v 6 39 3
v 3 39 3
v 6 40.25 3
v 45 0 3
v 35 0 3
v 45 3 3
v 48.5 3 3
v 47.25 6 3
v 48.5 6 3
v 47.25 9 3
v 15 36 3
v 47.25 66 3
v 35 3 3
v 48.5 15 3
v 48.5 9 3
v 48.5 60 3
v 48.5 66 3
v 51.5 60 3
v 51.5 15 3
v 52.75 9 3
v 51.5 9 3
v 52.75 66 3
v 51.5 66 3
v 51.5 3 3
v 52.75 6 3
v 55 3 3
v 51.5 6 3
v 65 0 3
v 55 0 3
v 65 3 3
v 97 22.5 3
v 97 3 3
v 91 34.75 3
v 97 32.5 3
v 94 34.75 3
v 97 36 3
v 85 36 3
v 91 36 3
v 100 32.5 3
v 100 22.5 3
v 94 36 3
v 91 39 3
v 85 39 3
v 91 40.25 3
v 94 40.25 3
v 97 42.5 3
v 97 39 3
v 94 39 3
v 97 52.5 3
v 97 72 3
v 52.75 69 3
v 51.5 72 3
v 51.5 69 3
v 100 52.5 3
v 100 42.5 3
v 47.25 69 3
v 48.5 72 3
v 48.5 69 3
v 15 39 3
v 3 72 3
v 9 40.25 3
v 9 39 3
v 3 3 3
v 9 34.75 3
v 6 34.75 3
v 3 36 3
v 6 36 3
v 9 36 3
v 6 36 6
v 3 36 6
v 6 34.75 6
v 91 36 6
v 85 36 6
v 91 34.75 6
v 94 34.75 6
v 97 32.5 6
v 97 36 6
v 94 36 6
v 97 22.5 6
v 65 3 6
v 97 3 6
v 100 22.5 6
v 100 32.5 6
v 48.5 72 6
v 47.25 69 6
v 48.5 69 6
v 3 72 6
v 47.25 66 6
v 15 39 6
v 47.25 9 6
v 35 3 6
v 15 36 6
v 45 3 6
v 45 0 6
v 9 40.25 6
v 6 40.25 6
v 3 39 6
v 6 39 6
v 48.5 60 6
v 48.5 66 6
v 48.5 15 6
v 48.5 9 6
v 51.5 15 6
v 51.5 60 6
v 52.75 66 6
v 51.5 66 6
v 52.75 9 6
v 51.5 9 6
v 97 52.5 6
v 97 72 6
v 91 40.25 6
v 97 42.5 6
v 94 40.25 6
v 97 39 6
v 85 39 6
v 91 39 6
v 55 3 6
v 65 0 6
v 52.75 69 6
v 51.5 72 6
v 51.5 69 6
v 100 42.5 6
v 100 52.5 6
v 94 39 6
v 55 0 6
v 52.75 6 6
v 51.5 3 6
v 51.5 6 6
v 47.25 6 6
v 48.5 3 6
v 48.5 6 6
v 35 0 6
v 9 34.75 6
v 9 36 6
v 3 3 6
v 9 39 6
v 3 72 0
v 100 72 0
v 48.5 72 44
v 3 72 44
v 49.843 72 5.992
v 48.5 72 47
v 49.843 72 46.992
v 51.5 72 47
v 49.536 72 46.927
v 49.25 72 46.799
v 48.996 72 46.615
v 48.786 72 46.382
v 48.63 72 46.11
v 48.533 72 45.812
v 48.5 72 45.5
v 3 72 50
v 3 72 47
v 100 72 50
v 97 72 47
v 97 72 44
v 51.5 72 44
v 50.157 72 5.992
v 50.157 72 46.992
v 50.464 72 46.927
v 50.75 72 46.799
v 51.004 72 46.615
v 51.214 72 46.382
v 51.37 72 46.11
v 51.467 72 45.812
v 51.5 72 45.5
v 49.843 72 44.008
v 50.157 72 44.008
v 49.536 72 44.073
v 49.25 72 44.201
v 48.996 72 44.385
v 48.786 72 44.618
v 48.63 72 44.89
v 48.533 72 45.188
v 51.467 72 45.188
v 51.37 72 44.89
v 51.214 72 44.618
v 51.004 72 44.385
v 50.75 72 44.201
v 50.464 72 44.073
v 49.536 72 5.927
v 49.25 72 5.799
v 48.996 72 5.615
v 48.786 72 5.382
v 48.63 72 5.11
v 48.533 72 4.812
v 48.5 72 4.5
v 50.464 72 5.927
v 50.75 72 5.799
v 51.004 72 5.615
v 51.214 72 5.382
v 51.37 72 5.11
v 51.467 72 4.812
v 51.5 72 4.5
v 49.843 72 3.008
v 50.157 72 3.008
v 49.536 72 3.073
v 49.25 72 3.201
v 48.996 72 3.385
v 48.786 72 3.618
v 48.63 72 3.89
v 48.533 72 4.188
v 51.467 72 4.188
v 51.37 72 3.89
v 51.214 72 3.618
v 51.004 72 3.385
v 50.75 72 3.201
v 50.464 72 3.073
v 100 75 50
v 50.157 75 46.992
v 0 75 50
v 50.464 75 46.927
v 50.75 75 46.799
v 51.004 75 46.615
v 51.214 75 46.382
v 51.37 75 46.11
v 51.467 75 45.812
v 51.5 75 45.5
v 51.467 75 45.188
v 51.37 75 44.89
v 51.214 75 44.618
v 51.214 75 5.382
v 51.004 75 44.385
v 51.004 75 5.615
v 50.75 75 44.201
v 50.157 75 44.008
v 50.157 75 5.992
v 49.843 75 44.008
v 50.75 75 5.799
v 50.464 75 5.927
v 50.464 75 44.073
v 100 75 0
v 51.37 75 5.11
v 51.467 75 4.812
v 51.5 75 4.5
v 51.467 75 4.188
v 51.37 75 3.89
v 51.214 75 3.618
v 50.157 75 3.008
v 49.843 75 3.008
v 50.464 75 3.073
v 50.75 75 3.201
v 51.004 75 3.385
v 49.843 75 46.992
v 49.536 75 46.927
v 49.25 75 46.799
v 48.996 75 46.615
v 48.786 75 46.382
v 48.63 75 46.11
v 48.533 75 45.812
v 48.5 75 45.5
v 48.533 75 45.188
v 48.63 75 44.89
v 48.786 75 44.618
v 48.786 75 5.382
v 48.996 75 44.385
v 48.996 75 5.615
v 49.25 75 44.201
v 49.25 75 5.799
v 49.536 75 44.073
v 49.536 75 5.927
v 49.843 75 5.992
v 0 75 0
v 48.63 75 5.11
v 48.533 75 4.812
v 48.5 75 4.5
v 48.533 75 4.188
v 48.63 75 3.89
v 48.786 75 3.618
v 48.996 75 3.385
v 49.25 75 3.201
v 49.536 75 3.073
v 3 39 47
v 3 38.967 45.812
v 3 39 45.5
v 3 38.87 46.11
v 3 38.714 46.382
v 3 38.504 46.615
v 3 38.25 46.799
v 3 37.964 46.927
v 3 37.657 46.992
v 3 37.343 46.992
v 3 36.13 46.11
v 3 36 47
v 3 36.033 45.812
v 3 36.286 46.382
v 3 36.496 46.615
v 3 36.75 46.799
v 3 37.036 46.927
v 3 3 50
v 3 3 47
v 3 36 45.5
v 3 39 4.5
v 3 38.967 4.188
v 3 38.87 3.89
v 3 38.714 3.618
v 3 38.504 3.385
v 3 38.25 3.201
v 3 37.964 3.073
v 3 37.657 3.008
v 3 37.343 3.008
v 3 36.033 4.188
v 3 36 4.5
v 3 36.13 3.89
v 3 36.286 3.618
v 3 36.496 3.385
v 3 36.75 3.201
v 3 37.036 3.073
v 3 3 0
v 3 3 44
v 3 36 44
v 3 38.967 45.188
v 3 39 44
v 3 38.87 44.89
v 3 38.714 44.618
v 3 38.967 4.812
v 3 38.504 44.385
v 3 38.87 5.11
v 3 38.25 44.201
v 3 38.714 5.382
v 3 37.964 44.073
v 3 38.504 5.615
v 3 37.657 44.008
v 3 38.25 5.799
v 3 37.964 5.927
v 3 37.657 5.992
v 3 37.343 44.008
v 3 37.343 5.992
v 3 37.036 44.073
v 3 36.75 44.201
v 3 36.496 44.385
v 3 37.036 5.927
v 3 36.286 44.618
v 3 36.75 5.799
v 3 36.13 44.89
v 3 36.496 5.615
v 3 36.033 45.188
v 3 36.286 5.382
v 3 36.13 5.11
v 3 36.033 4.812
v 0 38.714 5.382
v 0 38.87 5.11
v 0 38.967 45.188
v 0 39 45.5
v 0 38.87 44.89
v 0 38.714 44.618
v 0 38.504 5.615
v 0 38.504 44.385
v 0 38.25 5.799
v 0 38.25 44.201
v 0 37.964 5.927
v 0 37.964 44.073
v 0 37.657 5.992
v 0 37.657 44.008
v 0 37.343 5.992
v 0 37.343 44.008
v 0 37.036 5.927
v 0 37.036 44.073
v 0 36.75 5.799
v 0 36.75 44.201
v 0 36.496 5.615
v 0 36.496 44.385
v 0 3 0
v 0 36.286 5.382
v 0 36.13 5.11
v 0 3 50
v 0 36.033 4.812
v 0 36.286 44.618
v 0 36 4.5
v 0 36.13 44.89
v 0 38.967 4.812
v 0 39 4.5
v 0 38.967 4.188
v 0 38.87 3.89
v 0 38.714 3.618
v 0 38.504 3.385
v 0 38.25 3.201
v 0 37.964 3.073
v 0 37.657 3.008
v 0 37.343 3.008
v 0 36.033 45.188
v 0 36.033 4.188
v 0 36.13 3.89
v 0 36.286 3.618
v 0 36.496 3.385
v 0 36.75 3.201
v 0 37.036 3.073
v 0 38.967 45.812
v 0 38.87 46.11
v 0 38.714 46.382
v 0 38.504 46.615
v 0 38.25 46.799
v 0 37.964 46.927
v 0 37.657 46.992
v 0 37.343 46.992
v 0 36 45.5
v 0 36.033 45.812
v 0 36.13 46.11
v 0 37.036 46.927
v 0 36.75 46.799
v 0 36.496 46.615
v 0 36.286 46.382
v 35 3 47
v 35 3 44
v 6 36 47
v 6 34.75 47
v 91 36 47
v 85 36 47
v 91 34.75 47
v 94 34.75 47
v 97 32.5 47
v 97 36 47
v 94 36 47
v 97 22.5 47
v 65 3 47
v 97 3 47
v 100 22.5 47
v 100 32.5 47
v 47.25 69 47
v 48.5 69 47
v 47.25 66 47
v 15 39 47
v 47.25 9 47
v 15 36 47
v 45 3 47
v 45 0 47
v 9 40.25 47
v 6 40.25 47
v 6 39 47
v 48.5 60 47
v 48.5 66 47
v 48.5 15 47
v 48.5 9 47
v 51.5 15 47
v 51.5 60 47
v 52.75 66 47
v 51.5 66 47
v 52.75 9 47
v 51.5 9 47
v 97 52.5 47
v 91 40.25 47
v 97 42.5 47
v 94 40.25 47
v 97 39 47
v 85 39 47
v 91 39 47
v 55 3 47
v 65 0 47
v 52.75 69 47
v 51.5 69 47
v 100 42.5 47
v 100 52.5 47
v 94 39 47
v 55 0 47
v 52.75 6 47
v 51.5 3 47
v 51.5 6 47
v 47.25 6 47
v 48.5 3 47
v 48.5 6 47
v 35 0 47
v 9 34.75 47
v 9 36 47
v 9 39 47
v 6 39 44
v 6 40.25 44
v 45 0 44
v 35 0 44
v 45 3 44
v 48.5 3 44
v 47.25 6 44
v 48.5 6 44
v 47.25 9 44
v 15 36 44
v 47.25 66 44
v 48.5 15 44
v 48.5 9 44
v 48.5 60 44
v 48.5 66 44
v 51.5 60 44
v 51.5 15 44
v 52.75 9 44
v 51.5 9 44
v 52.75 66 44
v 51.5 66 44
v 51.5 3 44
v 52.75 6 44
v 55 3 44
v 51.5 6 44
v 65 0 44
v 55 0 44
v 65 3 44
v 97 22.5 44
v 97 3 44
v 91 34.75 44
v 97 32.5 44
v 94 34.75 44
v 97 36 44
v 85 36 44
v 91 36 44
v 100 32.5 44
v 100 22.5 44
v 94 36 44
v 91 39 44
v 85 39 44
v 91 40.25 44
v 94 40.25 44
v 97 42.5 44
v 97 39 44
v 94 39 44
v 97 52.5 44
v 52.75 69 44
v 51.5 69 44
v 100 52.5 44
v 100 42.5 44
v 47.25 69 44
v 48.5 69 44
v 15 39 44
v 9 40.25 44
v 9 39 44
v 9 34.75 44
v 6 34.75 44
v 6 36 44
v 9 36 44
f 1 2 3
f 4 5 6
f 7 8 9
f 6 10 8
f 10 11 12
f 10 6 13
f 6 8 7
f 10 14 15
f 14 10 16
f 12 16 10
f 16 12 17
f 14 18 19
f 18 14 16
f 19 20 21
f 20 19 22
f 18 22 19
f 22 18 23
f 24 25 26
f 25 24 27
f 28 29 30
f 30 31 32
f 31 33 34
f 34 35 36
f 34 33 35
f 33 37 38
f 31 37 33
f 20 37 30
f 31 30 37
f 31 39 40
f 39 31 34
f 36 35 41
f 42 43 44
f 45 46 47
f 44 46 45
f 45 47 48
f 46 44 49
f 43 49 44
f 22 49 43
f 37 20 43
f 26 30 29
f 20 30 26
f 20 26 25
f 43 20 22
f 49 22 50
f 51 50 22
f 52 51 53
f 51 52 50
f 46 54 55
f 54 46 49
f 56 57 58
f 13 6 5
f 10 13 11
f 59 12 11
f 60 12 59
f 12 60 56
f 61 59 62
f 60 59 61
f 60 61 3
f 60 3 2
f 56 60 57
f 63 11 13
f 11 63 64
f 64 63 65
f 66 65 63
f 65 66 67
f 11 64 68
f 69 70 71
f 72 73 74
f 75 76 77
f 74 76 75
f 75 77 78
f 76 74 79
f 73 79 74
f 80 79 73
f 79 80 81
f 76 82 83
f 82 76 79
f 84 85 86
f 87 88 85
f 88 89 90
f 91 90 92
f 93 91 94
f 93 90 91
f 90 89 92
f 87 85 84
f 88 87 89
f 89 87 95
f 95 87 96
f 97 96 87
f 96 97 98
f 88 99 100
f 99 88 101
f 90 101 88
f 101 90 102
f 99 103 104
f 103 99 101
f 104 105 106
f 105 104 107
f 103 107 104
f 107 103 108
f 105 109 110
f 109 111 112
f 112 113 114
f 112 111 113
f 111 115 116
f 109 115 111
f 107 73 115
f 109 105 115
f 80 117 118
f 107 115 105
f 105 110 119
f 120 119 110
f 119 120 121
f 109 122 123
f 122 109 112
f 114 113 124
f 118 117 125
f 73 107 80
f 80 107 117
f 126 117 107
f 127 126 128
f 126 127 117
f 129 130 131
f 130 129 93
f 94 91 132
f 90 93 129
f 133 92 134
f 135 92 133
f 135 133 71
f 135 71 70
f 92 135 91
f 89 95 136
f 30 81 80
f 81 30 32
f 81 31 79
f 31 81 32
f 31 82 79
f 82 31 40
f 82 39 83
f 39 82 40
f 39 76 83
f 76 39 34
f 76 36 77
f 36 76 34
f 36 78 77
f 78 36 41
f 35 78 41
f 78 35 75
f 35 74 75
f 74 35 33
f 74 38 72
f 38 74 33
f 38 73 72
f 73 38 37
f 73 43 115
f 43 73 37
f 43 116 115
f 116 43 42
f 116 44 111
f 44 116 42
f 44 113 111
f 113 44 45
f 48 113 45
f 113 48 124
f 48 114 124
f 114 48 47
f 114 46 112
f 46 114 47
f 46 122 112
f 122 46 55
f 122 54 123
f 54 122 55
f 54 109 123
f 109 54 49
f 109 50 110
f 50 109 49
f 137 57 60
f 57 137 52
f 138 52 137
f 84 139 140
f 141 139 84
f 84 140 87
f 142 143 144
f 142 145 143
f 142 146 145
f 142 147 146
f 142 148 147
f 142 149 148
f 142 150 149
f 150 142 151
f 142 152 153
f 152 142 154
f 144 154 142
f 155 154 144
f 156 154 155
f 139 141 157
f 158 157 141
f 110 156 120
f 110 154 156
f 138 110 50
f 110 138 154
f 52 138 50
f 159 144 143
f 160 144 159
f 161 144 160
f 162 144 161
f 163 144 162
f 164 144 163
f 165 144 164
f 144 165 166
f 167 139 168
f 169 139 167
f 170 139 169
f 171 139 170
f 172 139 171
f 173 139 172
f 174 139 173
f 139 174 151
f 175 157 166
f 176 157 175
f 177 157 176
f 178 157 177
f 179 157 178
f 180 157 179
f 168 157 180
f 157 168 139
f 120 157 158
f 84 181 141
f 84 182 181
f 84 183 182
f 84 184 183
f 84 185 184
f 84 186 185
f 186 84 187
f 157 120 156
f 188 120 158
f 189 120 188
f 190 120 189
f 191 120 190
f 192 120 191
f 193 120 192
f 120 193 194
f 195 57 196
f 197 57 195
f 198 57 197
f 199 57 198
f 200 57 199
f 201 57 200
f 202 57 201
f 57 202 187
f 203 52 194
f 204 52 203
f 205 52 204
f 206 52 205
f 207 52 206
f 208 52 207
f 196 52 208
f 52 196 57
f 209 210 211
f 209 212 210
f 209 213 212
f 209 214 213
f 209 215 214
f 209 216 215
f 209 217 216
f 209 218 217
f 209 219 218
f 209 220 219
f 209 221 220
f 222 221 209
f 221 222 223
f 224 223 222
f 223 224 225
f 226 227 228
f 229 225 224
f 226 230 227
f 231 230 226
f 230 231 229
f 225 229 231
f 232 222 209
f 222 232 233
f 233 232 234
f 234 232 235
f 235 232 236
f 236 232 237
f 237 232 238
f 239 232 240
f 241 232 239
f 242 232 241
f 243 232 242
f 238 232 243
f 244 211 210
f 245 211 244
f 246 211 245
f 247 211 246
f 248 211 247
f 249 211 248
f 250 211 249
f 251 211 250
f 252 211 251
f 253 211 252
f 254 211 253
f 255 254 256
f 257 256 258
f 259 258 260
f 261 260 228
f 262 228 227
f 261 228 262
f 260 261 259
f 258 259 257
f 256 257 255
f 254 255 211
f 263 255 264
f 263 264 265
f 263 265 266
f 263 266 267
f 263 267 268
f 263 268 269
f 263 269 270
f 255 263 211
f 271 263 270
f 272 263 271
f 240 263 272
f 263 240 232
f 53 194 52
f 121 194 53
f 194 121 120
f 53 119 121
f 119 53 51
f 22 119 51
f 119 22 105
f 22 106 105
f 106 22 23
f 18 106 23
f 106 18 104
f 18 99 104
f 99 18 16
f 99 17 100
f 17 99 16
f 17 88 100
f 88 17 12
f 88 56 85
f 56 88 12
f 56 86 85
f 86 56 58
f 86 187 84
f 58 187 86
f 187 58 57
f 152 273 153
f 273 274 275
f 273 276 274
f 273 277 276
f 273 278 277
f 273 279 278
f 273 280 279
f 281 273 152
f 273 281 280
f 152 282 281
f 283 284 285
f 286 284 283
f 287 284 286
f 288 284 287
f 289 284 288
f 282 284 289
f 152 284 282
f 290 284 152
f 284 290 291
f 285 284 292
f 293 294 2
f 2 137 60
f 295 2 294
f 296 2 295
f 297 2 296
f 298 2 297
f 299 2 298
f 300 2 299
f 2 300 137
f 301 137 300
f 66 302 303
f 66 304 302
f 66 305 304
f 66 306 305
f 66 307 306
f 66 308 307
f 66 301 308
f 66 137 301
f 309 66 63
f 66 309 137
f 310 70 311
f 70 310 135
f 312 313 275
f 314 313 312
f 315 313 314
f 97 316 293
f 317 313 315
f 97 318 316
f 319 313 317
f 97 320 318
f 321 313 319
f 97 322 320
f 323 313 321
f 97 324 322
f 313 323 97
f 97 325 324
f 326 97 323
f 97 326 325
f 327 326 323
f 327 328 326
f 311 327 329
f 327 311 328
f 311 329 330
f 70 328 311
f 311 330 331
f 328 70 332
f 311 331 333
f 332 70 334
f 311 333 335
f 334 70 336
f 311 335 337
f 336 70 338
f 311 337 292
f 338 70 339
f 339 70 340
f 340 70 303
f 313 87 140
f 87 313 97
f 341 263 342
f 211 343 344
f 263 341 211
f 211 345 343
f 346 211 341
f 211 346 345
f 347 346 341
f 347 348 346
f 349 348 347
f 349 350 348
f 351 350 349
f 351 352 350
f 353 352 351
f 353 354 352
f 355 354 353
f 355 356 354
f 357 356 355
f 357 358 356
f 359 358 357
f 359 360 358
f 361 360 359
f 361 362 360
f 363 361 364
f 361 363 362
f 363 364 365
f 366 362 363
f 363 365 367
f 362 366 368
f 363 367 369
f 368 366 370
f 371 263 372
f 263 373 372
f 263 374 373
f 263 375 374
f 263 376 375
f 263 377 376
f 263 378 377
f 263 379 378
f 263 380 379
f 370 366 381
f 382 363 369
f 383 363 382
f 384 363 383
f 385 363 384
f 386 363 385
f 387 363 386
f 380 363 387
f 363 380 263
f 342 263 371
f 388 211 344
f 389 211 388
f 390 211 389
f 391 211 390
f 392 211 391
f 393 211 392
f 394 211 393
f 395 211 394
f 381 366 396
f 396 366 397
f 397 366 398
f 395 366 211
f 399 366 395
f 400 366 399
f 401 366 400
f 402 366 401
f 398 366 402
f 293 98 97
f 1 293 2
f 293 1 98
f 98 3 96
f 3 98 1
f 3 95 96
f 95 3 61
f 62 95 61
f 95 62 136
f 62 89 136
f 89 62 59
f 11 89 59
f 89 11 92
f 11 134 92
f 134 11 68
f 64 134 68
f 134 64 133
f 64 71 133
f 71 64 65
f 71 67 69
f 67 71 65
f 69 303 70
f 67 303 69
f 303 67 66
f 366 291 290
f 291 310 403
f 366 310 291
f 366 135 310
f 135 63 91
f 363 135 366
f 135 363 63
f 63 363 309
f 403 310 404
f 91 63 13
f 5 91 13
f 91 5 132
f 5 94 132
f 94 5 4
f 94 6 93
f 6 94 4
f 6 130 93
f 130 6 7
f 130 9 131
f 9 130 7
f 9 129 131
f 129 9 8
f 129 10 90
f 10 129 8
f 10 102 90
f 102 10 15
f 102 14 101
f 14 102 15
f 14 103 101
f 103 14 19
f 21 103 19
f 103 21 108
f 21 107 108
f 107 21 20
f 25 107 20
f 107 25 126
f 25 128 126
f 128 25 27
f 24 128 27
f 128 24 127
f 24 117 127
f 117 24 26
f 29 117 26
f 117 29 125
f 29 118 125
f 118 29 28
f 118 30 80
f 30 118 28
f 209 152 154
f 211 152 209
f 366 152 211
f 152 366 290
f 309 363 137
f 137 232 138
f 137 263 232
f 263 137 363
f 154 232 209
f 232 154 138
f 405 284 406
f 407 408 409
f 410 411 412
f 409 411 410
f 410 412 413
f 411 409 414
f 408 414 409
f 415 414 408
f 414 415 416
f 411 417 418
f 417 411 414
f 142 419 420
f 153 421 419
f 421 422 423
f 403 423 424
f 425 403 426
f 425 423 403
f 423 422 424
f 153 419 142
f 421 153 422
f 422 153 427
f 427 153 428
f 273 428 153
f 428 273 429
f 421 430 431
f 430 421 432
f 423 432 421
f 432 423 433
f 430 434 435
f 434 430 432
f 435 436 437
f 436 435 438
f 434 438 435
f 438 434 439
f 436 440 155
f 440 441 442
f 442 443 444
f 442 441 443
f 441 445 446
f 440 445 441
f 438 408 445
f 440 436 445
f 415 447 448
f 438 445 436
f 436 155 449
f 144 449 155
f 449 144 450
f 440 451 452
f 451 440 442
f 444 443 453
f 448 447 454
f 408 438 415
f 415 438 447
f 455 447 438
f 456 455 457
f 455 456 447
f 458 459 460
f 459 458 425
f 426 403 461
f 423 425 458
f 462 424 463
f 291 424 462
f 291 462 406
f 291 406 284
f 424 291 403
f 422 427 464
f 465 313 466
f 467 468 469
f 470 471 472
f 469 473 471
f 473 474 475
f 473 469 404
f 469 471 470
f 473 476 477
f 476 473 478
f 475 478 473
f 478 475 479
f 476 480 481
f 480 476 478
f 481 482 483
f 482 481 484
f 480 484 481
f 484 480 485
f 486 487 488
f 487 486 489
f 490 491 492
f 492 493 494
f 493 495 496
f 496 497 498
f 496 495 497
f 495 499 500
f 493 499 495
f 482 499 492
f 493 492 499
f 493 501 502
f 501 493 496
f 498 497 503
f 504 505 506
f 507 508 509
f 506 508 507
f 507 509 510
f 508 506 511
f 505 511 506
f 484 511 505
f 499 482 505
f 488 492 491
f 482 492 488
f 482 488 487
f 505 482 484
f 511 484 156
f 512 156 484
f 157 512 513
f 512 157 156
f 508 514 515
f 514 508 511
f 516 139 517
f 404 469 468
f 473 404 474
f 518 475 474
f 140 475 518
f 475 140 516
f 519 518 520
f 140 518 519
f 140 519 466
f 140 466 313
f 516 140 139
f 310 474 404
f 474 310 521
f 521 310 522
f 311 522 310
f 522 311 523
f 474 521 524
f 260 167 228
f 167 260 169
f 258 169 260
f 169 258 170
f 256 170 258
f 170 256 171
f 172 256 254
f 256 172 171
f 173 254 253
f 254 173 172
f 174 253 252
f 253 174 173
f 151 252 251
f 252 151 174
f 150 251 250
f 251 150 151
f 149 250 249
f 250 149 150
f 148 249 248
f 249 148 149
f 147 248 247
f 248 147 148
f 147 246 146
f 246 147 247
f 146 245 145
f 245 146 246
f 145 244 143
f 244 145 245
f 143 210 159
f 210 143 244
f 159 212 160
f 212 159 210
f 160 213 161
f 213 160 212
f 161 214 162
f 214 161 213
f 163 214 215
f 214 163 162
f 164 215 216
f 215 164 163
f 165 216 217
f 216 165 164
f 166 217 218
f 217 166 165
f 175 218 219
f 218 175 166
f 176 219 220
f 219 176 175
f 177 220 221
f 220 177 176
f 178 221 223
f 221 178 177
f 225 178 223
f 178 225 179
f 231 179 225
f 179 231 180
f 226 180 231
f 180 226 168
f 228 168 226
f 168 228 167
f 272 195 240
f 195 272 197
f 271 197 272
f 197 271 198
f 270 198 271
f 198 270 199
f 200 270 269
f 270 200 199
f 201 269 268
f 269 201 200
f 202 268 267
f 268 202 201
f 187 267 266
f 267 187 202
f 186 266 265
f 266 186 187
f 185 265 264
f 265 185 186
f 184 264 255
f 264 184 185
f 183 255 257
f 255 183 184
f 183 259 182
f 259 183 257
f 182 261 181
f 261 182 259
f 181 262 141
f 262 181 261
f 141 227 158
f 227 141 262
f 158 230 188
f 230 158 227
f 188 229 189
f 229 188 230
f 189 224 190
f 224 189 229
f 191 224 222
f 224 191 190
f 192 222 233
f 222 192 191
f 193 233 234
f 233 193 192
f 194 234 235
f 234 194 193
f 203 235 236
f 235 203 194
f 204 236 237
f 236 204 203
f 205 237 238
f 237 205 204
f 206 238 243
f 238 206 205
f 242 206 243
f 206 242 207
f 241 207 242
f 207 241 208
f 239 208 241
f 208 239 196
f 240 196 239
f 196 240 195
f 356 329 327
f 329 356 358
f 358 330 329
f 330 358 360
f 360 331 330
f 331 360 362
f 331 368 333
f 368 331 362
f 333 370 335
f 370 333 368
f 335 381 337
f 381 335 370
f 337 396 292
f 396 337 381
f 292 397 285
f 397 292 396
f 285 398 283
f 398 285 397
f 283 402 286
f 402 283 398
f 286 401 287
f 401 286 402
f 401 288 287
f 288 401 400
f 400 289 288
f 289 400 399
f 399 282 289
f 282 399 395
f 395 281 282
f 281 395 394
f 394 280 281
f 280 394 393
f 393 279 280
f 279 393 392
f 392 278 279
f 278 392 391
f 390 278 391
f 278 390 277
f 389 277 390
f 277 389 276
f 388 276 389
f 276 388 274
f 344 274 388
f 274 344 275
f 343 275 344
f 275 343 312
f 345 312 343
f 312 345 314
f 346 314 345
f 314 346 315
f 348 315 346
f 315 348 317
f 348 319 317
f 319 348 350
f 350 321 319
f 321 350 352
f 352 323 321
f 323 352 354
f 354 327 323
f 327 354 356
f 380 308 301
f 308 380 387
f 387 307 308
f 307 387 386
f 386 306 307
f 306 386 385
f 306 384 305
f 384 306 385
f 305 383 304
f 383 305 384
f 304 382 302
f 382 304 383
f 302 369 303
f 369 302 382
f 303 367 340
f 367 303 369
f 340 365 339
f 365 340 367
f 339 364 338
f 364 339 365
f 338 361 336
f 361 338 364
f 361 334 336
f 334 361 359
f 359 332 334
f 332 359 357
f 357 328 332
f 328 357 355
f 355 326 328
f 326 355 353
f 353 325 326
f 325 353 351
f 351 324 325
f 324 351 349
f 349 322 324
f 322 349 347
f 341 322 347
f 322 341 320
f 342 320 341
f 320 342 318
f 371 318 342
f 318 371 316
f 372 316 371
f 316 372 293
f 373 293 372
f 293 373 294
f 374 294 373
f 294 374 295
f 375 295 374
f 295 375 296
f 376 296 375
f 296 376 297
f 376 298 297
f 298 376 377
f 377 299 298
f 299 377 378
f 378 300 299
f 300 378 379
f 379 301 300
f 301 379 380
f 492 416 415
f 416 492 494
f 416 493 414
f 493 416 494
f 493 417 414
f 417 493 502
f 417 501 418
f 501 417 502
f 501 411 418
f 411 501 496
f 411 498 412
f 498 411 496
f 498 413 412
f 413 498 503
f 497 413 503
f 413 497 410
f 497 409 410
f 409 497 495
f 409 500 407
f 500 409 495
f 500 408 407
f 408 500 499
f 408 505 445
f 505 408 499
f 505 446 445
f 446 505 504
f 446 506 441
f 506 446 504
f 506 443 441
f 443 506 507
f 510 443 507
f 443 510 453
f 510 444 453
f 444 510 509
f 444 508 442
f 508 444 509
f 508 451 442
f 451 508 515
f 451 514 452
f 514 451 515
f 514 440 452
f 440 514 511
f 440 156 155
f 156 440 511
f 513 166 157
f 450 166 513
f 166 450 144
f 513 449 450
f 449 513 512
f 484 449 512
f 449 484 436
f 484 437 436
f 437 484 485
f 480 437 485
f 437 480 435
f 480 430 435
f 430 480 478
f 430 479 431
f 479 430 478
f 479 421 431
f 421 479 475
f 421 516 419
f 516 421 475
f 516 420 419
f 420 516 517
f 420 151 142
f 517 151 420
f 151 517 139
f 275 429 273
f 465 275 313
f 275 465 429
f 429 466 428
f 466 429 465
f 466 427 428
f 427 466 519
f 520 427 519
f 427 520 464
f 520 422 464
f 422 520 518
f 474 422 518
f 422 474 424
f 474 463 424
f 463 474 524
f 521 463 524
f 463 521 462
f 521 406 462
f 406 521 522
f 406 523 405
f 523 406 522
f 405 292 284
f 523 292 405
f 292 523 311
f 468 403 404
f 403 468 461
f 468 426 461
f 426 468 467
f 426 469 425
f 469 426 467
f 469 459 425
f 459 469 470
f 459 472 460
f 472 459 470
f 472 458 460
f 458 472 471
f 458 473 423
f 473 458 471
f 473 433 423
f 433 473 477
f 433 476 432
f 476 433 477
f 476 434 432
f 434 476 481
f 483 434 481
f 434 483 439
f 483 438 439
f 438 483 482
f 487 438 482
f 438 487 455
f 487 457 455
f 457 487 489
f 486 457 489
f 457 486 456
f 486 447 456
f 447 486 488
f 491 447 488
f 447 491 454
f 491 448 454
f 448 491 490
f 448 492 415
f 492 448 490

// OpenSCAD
//From http://www.thingiverse.com/thing:27452
//By Peter Uithoven, FabLab Amersfoort
width = 100;
height = 50;
depth = 75;
materialThickness = 3;
offset = 0; // for lasercutter beam width

boltWidth = 3;
boltLength = 15;
nutWidth = 5.5;
nutHeight = 3;
spaceAroundBolt = 10;
plugWidth = 30;
plugHeight = materialThickness;

f = 1; // fix for overlapping edges issue
c = 30; //cornerResolution ($fn)
s = 1;//seperator dis.

// ungly, but we can't add to variables since they are calculated compile time
width2 = width+offset*2;
height2 = height+offset*2;
depth2 = depth+offset*2;
plugWidth2 = plugWidth+offset*2;
plugHeight2 = plugHeight+offset;
holeWidth2 = plugWidth-offset*2;
holeHeight2 = plugHeight-offset*2;

boltWidth2 = boltWidth-offset*2;
boltLength2 = boltLength-offset;
nutWidth2 = nutWidth-offset*2;
nutHeight2 = nutHeight-offset*2;
spaceAroundBolt2 = spaceAroundBolt-offset*2;

//export();
assembly3D();

module export()
{
	bottom();
	translate([width2+s,0,0]) top();

	translate([0,depth2+s,0]) front();
	translate([width2+s,depth2+s,0]) back();

	translate([0,depth2+s+height2+s,0]) left();
	translate([depth2-materialThickness*2+s,depth2+s+height2+s,0]) right();
}
module assembly3D()
{
	translate([0,0,materialThickness*1.5]) wood() bottom();
	%translate([0,materialThickness/2,0]) rotate([90,0,0]) wood() front();
	translate([0,depth2-materialThickness/2,0]) rotate([90,0,0]) wood() back();
	translate([materialThickness/2,materialThickness,0]) rotate([90,0,90]) wood() left();
	%translate([width2-materialThickness/2,materialThickness,0]) rotate([90,0,90]) wood() right();

	translate([0,0,height2-materialThickness*1.5-offset]) wood() top();
}

module bottom()
{
	difference()
	{
		union()
		{
			//TODO: incorporate f
			translate([plugHeight2,plugHeight2,0]) 	
				square([width2-plugHeight2*2,depth2-plugHeight2*2]);
		
			translate([width2/2,0,0]) plug();
			translate([width2/2,depth2,0]) 
				rotate([0,0,180]) plug();

			translate([0,depth2/2,0]) 
				rotate([0,0,-90]) plug();
			translate([width2,depth2/2,0]) 
				rotate([0,0,90]) plug();
		}
		translate([width2/2,0,0]) boltCutOut1();
		translate([width2/2,depth2,0]) 
			rotate([0,0,180]) boltCutOut1();
		translate([width2,depth/2,0]) rotate([0,0,90]) boltCutOut1();
		translate([0,depth/2,0]) rotate([0,0,-90]) boltCutOut1();
	}
}
module top()
{
	bottom();
}
module front()
{
	difference()
	{
		square([width2,height2]);
//width2/2-plugWidth2/2,materialThickness+offset
		translate([width2/2-holeWidth2/2,materialThickness+offset,0]) hole();
		translate([width2/2-holeWidth2/2,height-materialThickness-offset-holeHeight2,0]) hole();

		*translate([materialThickness+holeHeight2,height2/2-holeWidth2/2,0]) rotate([0,0,90]) hole();
		*translate([width2-materialThickness,height2/2-holeWidth2/2,0]) rotate([0,0,90]) hole();
	}
}
module back()
{
	front();
}
module left()
{
	width = depth2-materialThickness*2;
	height = height2;
	difference()
	{
		translate([0,0]) square([width,height]);
		translate([width/2-holeWidth2/2,materialThickness+offset,0]) hole();
		translate([width/2-holeWidth2/2,height-materialThickness-offset-holeHeight2,0]) hole();

		*translate([holeHeight2,height2/2-holeWidth2/2,0]) rotate([0,0,90]) hole();
		*translate([width-materialThickness,height2/2-holeWidth2/2,0]) rotate([0,0,90]) hole();
	}
}
module right()
{
	left();
}
module plug()
{
	translate([-plugWidth2/2,0,0]) square([plugWidth2,plugHeight2+f]);
}
module boltCutOut1()
{
	union()
	{
		translate([-spaceAroundBolt2/2,-f,0]) 
			square([spaceAroundBolt2,plugHeight2+f]);
		translate([-nutWidth2/2,plugHeight2+materialThickness,0]) 
			square([nutWidth2,nutHeight2]);
		translate([-boltWidth2/2,0,0]) 
			square([boltWidth2,boltLength2]);
	}
}
module hole()
{
	difference()
	{
		square([holeWidth2,holeHeight2]);
		translate([holeWidth2/2-spaceAroundBolt/2-offset,0,0]) 
			square([spaceAroundBolt+offset*2,holeHeight2]);
	}
	translate([holeWidth2/2,holeHeight2/2,0]) circle(r=boltWidth2/2,$fn=c);
}
module boltCutOut2()
{
	union()
	{
		translate([-spaceAroundBolt2/2,-f,0]) 
			square([spaceAroundBolt2,plugHeight2+f]);
		translate([-nutWidth2/2,plugHeight2+materialThickness,0]) 
			square([nutWidth2,nutHeight2]);
		translate([-boltWidth2/2,0,0]) 
			square([boltWidth2,boltLength2]);
	}
}
/////////////// utils ///////////////
module wood(alpha=1)
{
	h = materialThickness;
	color("BurlyWood",alpha) linear_extrude(height=h,convexity=c,center=true) for (i = [0 : $children-1]) child(i);
}
module mirrored(offset=0)
{
	translate([ offset/2, 0, 0]) for (i = [0 : $children-1]) child(i);
	translate([-offset/2, 0, 0]) scale([-1,1,1]) for (i = [0 : $children-1]) child(i);
}
module toiletRoll() {
	color("White")
	{
		difference() {
			cylinder(h = toiletRollHeigth, r=toiletRollRadius,$fn=c);
			translate([0,0,-f]) cylinder(h = toiletRollHeigth+f*2, r=toiletRollInnerRadius,$fn=c);
		}
	}	
}
